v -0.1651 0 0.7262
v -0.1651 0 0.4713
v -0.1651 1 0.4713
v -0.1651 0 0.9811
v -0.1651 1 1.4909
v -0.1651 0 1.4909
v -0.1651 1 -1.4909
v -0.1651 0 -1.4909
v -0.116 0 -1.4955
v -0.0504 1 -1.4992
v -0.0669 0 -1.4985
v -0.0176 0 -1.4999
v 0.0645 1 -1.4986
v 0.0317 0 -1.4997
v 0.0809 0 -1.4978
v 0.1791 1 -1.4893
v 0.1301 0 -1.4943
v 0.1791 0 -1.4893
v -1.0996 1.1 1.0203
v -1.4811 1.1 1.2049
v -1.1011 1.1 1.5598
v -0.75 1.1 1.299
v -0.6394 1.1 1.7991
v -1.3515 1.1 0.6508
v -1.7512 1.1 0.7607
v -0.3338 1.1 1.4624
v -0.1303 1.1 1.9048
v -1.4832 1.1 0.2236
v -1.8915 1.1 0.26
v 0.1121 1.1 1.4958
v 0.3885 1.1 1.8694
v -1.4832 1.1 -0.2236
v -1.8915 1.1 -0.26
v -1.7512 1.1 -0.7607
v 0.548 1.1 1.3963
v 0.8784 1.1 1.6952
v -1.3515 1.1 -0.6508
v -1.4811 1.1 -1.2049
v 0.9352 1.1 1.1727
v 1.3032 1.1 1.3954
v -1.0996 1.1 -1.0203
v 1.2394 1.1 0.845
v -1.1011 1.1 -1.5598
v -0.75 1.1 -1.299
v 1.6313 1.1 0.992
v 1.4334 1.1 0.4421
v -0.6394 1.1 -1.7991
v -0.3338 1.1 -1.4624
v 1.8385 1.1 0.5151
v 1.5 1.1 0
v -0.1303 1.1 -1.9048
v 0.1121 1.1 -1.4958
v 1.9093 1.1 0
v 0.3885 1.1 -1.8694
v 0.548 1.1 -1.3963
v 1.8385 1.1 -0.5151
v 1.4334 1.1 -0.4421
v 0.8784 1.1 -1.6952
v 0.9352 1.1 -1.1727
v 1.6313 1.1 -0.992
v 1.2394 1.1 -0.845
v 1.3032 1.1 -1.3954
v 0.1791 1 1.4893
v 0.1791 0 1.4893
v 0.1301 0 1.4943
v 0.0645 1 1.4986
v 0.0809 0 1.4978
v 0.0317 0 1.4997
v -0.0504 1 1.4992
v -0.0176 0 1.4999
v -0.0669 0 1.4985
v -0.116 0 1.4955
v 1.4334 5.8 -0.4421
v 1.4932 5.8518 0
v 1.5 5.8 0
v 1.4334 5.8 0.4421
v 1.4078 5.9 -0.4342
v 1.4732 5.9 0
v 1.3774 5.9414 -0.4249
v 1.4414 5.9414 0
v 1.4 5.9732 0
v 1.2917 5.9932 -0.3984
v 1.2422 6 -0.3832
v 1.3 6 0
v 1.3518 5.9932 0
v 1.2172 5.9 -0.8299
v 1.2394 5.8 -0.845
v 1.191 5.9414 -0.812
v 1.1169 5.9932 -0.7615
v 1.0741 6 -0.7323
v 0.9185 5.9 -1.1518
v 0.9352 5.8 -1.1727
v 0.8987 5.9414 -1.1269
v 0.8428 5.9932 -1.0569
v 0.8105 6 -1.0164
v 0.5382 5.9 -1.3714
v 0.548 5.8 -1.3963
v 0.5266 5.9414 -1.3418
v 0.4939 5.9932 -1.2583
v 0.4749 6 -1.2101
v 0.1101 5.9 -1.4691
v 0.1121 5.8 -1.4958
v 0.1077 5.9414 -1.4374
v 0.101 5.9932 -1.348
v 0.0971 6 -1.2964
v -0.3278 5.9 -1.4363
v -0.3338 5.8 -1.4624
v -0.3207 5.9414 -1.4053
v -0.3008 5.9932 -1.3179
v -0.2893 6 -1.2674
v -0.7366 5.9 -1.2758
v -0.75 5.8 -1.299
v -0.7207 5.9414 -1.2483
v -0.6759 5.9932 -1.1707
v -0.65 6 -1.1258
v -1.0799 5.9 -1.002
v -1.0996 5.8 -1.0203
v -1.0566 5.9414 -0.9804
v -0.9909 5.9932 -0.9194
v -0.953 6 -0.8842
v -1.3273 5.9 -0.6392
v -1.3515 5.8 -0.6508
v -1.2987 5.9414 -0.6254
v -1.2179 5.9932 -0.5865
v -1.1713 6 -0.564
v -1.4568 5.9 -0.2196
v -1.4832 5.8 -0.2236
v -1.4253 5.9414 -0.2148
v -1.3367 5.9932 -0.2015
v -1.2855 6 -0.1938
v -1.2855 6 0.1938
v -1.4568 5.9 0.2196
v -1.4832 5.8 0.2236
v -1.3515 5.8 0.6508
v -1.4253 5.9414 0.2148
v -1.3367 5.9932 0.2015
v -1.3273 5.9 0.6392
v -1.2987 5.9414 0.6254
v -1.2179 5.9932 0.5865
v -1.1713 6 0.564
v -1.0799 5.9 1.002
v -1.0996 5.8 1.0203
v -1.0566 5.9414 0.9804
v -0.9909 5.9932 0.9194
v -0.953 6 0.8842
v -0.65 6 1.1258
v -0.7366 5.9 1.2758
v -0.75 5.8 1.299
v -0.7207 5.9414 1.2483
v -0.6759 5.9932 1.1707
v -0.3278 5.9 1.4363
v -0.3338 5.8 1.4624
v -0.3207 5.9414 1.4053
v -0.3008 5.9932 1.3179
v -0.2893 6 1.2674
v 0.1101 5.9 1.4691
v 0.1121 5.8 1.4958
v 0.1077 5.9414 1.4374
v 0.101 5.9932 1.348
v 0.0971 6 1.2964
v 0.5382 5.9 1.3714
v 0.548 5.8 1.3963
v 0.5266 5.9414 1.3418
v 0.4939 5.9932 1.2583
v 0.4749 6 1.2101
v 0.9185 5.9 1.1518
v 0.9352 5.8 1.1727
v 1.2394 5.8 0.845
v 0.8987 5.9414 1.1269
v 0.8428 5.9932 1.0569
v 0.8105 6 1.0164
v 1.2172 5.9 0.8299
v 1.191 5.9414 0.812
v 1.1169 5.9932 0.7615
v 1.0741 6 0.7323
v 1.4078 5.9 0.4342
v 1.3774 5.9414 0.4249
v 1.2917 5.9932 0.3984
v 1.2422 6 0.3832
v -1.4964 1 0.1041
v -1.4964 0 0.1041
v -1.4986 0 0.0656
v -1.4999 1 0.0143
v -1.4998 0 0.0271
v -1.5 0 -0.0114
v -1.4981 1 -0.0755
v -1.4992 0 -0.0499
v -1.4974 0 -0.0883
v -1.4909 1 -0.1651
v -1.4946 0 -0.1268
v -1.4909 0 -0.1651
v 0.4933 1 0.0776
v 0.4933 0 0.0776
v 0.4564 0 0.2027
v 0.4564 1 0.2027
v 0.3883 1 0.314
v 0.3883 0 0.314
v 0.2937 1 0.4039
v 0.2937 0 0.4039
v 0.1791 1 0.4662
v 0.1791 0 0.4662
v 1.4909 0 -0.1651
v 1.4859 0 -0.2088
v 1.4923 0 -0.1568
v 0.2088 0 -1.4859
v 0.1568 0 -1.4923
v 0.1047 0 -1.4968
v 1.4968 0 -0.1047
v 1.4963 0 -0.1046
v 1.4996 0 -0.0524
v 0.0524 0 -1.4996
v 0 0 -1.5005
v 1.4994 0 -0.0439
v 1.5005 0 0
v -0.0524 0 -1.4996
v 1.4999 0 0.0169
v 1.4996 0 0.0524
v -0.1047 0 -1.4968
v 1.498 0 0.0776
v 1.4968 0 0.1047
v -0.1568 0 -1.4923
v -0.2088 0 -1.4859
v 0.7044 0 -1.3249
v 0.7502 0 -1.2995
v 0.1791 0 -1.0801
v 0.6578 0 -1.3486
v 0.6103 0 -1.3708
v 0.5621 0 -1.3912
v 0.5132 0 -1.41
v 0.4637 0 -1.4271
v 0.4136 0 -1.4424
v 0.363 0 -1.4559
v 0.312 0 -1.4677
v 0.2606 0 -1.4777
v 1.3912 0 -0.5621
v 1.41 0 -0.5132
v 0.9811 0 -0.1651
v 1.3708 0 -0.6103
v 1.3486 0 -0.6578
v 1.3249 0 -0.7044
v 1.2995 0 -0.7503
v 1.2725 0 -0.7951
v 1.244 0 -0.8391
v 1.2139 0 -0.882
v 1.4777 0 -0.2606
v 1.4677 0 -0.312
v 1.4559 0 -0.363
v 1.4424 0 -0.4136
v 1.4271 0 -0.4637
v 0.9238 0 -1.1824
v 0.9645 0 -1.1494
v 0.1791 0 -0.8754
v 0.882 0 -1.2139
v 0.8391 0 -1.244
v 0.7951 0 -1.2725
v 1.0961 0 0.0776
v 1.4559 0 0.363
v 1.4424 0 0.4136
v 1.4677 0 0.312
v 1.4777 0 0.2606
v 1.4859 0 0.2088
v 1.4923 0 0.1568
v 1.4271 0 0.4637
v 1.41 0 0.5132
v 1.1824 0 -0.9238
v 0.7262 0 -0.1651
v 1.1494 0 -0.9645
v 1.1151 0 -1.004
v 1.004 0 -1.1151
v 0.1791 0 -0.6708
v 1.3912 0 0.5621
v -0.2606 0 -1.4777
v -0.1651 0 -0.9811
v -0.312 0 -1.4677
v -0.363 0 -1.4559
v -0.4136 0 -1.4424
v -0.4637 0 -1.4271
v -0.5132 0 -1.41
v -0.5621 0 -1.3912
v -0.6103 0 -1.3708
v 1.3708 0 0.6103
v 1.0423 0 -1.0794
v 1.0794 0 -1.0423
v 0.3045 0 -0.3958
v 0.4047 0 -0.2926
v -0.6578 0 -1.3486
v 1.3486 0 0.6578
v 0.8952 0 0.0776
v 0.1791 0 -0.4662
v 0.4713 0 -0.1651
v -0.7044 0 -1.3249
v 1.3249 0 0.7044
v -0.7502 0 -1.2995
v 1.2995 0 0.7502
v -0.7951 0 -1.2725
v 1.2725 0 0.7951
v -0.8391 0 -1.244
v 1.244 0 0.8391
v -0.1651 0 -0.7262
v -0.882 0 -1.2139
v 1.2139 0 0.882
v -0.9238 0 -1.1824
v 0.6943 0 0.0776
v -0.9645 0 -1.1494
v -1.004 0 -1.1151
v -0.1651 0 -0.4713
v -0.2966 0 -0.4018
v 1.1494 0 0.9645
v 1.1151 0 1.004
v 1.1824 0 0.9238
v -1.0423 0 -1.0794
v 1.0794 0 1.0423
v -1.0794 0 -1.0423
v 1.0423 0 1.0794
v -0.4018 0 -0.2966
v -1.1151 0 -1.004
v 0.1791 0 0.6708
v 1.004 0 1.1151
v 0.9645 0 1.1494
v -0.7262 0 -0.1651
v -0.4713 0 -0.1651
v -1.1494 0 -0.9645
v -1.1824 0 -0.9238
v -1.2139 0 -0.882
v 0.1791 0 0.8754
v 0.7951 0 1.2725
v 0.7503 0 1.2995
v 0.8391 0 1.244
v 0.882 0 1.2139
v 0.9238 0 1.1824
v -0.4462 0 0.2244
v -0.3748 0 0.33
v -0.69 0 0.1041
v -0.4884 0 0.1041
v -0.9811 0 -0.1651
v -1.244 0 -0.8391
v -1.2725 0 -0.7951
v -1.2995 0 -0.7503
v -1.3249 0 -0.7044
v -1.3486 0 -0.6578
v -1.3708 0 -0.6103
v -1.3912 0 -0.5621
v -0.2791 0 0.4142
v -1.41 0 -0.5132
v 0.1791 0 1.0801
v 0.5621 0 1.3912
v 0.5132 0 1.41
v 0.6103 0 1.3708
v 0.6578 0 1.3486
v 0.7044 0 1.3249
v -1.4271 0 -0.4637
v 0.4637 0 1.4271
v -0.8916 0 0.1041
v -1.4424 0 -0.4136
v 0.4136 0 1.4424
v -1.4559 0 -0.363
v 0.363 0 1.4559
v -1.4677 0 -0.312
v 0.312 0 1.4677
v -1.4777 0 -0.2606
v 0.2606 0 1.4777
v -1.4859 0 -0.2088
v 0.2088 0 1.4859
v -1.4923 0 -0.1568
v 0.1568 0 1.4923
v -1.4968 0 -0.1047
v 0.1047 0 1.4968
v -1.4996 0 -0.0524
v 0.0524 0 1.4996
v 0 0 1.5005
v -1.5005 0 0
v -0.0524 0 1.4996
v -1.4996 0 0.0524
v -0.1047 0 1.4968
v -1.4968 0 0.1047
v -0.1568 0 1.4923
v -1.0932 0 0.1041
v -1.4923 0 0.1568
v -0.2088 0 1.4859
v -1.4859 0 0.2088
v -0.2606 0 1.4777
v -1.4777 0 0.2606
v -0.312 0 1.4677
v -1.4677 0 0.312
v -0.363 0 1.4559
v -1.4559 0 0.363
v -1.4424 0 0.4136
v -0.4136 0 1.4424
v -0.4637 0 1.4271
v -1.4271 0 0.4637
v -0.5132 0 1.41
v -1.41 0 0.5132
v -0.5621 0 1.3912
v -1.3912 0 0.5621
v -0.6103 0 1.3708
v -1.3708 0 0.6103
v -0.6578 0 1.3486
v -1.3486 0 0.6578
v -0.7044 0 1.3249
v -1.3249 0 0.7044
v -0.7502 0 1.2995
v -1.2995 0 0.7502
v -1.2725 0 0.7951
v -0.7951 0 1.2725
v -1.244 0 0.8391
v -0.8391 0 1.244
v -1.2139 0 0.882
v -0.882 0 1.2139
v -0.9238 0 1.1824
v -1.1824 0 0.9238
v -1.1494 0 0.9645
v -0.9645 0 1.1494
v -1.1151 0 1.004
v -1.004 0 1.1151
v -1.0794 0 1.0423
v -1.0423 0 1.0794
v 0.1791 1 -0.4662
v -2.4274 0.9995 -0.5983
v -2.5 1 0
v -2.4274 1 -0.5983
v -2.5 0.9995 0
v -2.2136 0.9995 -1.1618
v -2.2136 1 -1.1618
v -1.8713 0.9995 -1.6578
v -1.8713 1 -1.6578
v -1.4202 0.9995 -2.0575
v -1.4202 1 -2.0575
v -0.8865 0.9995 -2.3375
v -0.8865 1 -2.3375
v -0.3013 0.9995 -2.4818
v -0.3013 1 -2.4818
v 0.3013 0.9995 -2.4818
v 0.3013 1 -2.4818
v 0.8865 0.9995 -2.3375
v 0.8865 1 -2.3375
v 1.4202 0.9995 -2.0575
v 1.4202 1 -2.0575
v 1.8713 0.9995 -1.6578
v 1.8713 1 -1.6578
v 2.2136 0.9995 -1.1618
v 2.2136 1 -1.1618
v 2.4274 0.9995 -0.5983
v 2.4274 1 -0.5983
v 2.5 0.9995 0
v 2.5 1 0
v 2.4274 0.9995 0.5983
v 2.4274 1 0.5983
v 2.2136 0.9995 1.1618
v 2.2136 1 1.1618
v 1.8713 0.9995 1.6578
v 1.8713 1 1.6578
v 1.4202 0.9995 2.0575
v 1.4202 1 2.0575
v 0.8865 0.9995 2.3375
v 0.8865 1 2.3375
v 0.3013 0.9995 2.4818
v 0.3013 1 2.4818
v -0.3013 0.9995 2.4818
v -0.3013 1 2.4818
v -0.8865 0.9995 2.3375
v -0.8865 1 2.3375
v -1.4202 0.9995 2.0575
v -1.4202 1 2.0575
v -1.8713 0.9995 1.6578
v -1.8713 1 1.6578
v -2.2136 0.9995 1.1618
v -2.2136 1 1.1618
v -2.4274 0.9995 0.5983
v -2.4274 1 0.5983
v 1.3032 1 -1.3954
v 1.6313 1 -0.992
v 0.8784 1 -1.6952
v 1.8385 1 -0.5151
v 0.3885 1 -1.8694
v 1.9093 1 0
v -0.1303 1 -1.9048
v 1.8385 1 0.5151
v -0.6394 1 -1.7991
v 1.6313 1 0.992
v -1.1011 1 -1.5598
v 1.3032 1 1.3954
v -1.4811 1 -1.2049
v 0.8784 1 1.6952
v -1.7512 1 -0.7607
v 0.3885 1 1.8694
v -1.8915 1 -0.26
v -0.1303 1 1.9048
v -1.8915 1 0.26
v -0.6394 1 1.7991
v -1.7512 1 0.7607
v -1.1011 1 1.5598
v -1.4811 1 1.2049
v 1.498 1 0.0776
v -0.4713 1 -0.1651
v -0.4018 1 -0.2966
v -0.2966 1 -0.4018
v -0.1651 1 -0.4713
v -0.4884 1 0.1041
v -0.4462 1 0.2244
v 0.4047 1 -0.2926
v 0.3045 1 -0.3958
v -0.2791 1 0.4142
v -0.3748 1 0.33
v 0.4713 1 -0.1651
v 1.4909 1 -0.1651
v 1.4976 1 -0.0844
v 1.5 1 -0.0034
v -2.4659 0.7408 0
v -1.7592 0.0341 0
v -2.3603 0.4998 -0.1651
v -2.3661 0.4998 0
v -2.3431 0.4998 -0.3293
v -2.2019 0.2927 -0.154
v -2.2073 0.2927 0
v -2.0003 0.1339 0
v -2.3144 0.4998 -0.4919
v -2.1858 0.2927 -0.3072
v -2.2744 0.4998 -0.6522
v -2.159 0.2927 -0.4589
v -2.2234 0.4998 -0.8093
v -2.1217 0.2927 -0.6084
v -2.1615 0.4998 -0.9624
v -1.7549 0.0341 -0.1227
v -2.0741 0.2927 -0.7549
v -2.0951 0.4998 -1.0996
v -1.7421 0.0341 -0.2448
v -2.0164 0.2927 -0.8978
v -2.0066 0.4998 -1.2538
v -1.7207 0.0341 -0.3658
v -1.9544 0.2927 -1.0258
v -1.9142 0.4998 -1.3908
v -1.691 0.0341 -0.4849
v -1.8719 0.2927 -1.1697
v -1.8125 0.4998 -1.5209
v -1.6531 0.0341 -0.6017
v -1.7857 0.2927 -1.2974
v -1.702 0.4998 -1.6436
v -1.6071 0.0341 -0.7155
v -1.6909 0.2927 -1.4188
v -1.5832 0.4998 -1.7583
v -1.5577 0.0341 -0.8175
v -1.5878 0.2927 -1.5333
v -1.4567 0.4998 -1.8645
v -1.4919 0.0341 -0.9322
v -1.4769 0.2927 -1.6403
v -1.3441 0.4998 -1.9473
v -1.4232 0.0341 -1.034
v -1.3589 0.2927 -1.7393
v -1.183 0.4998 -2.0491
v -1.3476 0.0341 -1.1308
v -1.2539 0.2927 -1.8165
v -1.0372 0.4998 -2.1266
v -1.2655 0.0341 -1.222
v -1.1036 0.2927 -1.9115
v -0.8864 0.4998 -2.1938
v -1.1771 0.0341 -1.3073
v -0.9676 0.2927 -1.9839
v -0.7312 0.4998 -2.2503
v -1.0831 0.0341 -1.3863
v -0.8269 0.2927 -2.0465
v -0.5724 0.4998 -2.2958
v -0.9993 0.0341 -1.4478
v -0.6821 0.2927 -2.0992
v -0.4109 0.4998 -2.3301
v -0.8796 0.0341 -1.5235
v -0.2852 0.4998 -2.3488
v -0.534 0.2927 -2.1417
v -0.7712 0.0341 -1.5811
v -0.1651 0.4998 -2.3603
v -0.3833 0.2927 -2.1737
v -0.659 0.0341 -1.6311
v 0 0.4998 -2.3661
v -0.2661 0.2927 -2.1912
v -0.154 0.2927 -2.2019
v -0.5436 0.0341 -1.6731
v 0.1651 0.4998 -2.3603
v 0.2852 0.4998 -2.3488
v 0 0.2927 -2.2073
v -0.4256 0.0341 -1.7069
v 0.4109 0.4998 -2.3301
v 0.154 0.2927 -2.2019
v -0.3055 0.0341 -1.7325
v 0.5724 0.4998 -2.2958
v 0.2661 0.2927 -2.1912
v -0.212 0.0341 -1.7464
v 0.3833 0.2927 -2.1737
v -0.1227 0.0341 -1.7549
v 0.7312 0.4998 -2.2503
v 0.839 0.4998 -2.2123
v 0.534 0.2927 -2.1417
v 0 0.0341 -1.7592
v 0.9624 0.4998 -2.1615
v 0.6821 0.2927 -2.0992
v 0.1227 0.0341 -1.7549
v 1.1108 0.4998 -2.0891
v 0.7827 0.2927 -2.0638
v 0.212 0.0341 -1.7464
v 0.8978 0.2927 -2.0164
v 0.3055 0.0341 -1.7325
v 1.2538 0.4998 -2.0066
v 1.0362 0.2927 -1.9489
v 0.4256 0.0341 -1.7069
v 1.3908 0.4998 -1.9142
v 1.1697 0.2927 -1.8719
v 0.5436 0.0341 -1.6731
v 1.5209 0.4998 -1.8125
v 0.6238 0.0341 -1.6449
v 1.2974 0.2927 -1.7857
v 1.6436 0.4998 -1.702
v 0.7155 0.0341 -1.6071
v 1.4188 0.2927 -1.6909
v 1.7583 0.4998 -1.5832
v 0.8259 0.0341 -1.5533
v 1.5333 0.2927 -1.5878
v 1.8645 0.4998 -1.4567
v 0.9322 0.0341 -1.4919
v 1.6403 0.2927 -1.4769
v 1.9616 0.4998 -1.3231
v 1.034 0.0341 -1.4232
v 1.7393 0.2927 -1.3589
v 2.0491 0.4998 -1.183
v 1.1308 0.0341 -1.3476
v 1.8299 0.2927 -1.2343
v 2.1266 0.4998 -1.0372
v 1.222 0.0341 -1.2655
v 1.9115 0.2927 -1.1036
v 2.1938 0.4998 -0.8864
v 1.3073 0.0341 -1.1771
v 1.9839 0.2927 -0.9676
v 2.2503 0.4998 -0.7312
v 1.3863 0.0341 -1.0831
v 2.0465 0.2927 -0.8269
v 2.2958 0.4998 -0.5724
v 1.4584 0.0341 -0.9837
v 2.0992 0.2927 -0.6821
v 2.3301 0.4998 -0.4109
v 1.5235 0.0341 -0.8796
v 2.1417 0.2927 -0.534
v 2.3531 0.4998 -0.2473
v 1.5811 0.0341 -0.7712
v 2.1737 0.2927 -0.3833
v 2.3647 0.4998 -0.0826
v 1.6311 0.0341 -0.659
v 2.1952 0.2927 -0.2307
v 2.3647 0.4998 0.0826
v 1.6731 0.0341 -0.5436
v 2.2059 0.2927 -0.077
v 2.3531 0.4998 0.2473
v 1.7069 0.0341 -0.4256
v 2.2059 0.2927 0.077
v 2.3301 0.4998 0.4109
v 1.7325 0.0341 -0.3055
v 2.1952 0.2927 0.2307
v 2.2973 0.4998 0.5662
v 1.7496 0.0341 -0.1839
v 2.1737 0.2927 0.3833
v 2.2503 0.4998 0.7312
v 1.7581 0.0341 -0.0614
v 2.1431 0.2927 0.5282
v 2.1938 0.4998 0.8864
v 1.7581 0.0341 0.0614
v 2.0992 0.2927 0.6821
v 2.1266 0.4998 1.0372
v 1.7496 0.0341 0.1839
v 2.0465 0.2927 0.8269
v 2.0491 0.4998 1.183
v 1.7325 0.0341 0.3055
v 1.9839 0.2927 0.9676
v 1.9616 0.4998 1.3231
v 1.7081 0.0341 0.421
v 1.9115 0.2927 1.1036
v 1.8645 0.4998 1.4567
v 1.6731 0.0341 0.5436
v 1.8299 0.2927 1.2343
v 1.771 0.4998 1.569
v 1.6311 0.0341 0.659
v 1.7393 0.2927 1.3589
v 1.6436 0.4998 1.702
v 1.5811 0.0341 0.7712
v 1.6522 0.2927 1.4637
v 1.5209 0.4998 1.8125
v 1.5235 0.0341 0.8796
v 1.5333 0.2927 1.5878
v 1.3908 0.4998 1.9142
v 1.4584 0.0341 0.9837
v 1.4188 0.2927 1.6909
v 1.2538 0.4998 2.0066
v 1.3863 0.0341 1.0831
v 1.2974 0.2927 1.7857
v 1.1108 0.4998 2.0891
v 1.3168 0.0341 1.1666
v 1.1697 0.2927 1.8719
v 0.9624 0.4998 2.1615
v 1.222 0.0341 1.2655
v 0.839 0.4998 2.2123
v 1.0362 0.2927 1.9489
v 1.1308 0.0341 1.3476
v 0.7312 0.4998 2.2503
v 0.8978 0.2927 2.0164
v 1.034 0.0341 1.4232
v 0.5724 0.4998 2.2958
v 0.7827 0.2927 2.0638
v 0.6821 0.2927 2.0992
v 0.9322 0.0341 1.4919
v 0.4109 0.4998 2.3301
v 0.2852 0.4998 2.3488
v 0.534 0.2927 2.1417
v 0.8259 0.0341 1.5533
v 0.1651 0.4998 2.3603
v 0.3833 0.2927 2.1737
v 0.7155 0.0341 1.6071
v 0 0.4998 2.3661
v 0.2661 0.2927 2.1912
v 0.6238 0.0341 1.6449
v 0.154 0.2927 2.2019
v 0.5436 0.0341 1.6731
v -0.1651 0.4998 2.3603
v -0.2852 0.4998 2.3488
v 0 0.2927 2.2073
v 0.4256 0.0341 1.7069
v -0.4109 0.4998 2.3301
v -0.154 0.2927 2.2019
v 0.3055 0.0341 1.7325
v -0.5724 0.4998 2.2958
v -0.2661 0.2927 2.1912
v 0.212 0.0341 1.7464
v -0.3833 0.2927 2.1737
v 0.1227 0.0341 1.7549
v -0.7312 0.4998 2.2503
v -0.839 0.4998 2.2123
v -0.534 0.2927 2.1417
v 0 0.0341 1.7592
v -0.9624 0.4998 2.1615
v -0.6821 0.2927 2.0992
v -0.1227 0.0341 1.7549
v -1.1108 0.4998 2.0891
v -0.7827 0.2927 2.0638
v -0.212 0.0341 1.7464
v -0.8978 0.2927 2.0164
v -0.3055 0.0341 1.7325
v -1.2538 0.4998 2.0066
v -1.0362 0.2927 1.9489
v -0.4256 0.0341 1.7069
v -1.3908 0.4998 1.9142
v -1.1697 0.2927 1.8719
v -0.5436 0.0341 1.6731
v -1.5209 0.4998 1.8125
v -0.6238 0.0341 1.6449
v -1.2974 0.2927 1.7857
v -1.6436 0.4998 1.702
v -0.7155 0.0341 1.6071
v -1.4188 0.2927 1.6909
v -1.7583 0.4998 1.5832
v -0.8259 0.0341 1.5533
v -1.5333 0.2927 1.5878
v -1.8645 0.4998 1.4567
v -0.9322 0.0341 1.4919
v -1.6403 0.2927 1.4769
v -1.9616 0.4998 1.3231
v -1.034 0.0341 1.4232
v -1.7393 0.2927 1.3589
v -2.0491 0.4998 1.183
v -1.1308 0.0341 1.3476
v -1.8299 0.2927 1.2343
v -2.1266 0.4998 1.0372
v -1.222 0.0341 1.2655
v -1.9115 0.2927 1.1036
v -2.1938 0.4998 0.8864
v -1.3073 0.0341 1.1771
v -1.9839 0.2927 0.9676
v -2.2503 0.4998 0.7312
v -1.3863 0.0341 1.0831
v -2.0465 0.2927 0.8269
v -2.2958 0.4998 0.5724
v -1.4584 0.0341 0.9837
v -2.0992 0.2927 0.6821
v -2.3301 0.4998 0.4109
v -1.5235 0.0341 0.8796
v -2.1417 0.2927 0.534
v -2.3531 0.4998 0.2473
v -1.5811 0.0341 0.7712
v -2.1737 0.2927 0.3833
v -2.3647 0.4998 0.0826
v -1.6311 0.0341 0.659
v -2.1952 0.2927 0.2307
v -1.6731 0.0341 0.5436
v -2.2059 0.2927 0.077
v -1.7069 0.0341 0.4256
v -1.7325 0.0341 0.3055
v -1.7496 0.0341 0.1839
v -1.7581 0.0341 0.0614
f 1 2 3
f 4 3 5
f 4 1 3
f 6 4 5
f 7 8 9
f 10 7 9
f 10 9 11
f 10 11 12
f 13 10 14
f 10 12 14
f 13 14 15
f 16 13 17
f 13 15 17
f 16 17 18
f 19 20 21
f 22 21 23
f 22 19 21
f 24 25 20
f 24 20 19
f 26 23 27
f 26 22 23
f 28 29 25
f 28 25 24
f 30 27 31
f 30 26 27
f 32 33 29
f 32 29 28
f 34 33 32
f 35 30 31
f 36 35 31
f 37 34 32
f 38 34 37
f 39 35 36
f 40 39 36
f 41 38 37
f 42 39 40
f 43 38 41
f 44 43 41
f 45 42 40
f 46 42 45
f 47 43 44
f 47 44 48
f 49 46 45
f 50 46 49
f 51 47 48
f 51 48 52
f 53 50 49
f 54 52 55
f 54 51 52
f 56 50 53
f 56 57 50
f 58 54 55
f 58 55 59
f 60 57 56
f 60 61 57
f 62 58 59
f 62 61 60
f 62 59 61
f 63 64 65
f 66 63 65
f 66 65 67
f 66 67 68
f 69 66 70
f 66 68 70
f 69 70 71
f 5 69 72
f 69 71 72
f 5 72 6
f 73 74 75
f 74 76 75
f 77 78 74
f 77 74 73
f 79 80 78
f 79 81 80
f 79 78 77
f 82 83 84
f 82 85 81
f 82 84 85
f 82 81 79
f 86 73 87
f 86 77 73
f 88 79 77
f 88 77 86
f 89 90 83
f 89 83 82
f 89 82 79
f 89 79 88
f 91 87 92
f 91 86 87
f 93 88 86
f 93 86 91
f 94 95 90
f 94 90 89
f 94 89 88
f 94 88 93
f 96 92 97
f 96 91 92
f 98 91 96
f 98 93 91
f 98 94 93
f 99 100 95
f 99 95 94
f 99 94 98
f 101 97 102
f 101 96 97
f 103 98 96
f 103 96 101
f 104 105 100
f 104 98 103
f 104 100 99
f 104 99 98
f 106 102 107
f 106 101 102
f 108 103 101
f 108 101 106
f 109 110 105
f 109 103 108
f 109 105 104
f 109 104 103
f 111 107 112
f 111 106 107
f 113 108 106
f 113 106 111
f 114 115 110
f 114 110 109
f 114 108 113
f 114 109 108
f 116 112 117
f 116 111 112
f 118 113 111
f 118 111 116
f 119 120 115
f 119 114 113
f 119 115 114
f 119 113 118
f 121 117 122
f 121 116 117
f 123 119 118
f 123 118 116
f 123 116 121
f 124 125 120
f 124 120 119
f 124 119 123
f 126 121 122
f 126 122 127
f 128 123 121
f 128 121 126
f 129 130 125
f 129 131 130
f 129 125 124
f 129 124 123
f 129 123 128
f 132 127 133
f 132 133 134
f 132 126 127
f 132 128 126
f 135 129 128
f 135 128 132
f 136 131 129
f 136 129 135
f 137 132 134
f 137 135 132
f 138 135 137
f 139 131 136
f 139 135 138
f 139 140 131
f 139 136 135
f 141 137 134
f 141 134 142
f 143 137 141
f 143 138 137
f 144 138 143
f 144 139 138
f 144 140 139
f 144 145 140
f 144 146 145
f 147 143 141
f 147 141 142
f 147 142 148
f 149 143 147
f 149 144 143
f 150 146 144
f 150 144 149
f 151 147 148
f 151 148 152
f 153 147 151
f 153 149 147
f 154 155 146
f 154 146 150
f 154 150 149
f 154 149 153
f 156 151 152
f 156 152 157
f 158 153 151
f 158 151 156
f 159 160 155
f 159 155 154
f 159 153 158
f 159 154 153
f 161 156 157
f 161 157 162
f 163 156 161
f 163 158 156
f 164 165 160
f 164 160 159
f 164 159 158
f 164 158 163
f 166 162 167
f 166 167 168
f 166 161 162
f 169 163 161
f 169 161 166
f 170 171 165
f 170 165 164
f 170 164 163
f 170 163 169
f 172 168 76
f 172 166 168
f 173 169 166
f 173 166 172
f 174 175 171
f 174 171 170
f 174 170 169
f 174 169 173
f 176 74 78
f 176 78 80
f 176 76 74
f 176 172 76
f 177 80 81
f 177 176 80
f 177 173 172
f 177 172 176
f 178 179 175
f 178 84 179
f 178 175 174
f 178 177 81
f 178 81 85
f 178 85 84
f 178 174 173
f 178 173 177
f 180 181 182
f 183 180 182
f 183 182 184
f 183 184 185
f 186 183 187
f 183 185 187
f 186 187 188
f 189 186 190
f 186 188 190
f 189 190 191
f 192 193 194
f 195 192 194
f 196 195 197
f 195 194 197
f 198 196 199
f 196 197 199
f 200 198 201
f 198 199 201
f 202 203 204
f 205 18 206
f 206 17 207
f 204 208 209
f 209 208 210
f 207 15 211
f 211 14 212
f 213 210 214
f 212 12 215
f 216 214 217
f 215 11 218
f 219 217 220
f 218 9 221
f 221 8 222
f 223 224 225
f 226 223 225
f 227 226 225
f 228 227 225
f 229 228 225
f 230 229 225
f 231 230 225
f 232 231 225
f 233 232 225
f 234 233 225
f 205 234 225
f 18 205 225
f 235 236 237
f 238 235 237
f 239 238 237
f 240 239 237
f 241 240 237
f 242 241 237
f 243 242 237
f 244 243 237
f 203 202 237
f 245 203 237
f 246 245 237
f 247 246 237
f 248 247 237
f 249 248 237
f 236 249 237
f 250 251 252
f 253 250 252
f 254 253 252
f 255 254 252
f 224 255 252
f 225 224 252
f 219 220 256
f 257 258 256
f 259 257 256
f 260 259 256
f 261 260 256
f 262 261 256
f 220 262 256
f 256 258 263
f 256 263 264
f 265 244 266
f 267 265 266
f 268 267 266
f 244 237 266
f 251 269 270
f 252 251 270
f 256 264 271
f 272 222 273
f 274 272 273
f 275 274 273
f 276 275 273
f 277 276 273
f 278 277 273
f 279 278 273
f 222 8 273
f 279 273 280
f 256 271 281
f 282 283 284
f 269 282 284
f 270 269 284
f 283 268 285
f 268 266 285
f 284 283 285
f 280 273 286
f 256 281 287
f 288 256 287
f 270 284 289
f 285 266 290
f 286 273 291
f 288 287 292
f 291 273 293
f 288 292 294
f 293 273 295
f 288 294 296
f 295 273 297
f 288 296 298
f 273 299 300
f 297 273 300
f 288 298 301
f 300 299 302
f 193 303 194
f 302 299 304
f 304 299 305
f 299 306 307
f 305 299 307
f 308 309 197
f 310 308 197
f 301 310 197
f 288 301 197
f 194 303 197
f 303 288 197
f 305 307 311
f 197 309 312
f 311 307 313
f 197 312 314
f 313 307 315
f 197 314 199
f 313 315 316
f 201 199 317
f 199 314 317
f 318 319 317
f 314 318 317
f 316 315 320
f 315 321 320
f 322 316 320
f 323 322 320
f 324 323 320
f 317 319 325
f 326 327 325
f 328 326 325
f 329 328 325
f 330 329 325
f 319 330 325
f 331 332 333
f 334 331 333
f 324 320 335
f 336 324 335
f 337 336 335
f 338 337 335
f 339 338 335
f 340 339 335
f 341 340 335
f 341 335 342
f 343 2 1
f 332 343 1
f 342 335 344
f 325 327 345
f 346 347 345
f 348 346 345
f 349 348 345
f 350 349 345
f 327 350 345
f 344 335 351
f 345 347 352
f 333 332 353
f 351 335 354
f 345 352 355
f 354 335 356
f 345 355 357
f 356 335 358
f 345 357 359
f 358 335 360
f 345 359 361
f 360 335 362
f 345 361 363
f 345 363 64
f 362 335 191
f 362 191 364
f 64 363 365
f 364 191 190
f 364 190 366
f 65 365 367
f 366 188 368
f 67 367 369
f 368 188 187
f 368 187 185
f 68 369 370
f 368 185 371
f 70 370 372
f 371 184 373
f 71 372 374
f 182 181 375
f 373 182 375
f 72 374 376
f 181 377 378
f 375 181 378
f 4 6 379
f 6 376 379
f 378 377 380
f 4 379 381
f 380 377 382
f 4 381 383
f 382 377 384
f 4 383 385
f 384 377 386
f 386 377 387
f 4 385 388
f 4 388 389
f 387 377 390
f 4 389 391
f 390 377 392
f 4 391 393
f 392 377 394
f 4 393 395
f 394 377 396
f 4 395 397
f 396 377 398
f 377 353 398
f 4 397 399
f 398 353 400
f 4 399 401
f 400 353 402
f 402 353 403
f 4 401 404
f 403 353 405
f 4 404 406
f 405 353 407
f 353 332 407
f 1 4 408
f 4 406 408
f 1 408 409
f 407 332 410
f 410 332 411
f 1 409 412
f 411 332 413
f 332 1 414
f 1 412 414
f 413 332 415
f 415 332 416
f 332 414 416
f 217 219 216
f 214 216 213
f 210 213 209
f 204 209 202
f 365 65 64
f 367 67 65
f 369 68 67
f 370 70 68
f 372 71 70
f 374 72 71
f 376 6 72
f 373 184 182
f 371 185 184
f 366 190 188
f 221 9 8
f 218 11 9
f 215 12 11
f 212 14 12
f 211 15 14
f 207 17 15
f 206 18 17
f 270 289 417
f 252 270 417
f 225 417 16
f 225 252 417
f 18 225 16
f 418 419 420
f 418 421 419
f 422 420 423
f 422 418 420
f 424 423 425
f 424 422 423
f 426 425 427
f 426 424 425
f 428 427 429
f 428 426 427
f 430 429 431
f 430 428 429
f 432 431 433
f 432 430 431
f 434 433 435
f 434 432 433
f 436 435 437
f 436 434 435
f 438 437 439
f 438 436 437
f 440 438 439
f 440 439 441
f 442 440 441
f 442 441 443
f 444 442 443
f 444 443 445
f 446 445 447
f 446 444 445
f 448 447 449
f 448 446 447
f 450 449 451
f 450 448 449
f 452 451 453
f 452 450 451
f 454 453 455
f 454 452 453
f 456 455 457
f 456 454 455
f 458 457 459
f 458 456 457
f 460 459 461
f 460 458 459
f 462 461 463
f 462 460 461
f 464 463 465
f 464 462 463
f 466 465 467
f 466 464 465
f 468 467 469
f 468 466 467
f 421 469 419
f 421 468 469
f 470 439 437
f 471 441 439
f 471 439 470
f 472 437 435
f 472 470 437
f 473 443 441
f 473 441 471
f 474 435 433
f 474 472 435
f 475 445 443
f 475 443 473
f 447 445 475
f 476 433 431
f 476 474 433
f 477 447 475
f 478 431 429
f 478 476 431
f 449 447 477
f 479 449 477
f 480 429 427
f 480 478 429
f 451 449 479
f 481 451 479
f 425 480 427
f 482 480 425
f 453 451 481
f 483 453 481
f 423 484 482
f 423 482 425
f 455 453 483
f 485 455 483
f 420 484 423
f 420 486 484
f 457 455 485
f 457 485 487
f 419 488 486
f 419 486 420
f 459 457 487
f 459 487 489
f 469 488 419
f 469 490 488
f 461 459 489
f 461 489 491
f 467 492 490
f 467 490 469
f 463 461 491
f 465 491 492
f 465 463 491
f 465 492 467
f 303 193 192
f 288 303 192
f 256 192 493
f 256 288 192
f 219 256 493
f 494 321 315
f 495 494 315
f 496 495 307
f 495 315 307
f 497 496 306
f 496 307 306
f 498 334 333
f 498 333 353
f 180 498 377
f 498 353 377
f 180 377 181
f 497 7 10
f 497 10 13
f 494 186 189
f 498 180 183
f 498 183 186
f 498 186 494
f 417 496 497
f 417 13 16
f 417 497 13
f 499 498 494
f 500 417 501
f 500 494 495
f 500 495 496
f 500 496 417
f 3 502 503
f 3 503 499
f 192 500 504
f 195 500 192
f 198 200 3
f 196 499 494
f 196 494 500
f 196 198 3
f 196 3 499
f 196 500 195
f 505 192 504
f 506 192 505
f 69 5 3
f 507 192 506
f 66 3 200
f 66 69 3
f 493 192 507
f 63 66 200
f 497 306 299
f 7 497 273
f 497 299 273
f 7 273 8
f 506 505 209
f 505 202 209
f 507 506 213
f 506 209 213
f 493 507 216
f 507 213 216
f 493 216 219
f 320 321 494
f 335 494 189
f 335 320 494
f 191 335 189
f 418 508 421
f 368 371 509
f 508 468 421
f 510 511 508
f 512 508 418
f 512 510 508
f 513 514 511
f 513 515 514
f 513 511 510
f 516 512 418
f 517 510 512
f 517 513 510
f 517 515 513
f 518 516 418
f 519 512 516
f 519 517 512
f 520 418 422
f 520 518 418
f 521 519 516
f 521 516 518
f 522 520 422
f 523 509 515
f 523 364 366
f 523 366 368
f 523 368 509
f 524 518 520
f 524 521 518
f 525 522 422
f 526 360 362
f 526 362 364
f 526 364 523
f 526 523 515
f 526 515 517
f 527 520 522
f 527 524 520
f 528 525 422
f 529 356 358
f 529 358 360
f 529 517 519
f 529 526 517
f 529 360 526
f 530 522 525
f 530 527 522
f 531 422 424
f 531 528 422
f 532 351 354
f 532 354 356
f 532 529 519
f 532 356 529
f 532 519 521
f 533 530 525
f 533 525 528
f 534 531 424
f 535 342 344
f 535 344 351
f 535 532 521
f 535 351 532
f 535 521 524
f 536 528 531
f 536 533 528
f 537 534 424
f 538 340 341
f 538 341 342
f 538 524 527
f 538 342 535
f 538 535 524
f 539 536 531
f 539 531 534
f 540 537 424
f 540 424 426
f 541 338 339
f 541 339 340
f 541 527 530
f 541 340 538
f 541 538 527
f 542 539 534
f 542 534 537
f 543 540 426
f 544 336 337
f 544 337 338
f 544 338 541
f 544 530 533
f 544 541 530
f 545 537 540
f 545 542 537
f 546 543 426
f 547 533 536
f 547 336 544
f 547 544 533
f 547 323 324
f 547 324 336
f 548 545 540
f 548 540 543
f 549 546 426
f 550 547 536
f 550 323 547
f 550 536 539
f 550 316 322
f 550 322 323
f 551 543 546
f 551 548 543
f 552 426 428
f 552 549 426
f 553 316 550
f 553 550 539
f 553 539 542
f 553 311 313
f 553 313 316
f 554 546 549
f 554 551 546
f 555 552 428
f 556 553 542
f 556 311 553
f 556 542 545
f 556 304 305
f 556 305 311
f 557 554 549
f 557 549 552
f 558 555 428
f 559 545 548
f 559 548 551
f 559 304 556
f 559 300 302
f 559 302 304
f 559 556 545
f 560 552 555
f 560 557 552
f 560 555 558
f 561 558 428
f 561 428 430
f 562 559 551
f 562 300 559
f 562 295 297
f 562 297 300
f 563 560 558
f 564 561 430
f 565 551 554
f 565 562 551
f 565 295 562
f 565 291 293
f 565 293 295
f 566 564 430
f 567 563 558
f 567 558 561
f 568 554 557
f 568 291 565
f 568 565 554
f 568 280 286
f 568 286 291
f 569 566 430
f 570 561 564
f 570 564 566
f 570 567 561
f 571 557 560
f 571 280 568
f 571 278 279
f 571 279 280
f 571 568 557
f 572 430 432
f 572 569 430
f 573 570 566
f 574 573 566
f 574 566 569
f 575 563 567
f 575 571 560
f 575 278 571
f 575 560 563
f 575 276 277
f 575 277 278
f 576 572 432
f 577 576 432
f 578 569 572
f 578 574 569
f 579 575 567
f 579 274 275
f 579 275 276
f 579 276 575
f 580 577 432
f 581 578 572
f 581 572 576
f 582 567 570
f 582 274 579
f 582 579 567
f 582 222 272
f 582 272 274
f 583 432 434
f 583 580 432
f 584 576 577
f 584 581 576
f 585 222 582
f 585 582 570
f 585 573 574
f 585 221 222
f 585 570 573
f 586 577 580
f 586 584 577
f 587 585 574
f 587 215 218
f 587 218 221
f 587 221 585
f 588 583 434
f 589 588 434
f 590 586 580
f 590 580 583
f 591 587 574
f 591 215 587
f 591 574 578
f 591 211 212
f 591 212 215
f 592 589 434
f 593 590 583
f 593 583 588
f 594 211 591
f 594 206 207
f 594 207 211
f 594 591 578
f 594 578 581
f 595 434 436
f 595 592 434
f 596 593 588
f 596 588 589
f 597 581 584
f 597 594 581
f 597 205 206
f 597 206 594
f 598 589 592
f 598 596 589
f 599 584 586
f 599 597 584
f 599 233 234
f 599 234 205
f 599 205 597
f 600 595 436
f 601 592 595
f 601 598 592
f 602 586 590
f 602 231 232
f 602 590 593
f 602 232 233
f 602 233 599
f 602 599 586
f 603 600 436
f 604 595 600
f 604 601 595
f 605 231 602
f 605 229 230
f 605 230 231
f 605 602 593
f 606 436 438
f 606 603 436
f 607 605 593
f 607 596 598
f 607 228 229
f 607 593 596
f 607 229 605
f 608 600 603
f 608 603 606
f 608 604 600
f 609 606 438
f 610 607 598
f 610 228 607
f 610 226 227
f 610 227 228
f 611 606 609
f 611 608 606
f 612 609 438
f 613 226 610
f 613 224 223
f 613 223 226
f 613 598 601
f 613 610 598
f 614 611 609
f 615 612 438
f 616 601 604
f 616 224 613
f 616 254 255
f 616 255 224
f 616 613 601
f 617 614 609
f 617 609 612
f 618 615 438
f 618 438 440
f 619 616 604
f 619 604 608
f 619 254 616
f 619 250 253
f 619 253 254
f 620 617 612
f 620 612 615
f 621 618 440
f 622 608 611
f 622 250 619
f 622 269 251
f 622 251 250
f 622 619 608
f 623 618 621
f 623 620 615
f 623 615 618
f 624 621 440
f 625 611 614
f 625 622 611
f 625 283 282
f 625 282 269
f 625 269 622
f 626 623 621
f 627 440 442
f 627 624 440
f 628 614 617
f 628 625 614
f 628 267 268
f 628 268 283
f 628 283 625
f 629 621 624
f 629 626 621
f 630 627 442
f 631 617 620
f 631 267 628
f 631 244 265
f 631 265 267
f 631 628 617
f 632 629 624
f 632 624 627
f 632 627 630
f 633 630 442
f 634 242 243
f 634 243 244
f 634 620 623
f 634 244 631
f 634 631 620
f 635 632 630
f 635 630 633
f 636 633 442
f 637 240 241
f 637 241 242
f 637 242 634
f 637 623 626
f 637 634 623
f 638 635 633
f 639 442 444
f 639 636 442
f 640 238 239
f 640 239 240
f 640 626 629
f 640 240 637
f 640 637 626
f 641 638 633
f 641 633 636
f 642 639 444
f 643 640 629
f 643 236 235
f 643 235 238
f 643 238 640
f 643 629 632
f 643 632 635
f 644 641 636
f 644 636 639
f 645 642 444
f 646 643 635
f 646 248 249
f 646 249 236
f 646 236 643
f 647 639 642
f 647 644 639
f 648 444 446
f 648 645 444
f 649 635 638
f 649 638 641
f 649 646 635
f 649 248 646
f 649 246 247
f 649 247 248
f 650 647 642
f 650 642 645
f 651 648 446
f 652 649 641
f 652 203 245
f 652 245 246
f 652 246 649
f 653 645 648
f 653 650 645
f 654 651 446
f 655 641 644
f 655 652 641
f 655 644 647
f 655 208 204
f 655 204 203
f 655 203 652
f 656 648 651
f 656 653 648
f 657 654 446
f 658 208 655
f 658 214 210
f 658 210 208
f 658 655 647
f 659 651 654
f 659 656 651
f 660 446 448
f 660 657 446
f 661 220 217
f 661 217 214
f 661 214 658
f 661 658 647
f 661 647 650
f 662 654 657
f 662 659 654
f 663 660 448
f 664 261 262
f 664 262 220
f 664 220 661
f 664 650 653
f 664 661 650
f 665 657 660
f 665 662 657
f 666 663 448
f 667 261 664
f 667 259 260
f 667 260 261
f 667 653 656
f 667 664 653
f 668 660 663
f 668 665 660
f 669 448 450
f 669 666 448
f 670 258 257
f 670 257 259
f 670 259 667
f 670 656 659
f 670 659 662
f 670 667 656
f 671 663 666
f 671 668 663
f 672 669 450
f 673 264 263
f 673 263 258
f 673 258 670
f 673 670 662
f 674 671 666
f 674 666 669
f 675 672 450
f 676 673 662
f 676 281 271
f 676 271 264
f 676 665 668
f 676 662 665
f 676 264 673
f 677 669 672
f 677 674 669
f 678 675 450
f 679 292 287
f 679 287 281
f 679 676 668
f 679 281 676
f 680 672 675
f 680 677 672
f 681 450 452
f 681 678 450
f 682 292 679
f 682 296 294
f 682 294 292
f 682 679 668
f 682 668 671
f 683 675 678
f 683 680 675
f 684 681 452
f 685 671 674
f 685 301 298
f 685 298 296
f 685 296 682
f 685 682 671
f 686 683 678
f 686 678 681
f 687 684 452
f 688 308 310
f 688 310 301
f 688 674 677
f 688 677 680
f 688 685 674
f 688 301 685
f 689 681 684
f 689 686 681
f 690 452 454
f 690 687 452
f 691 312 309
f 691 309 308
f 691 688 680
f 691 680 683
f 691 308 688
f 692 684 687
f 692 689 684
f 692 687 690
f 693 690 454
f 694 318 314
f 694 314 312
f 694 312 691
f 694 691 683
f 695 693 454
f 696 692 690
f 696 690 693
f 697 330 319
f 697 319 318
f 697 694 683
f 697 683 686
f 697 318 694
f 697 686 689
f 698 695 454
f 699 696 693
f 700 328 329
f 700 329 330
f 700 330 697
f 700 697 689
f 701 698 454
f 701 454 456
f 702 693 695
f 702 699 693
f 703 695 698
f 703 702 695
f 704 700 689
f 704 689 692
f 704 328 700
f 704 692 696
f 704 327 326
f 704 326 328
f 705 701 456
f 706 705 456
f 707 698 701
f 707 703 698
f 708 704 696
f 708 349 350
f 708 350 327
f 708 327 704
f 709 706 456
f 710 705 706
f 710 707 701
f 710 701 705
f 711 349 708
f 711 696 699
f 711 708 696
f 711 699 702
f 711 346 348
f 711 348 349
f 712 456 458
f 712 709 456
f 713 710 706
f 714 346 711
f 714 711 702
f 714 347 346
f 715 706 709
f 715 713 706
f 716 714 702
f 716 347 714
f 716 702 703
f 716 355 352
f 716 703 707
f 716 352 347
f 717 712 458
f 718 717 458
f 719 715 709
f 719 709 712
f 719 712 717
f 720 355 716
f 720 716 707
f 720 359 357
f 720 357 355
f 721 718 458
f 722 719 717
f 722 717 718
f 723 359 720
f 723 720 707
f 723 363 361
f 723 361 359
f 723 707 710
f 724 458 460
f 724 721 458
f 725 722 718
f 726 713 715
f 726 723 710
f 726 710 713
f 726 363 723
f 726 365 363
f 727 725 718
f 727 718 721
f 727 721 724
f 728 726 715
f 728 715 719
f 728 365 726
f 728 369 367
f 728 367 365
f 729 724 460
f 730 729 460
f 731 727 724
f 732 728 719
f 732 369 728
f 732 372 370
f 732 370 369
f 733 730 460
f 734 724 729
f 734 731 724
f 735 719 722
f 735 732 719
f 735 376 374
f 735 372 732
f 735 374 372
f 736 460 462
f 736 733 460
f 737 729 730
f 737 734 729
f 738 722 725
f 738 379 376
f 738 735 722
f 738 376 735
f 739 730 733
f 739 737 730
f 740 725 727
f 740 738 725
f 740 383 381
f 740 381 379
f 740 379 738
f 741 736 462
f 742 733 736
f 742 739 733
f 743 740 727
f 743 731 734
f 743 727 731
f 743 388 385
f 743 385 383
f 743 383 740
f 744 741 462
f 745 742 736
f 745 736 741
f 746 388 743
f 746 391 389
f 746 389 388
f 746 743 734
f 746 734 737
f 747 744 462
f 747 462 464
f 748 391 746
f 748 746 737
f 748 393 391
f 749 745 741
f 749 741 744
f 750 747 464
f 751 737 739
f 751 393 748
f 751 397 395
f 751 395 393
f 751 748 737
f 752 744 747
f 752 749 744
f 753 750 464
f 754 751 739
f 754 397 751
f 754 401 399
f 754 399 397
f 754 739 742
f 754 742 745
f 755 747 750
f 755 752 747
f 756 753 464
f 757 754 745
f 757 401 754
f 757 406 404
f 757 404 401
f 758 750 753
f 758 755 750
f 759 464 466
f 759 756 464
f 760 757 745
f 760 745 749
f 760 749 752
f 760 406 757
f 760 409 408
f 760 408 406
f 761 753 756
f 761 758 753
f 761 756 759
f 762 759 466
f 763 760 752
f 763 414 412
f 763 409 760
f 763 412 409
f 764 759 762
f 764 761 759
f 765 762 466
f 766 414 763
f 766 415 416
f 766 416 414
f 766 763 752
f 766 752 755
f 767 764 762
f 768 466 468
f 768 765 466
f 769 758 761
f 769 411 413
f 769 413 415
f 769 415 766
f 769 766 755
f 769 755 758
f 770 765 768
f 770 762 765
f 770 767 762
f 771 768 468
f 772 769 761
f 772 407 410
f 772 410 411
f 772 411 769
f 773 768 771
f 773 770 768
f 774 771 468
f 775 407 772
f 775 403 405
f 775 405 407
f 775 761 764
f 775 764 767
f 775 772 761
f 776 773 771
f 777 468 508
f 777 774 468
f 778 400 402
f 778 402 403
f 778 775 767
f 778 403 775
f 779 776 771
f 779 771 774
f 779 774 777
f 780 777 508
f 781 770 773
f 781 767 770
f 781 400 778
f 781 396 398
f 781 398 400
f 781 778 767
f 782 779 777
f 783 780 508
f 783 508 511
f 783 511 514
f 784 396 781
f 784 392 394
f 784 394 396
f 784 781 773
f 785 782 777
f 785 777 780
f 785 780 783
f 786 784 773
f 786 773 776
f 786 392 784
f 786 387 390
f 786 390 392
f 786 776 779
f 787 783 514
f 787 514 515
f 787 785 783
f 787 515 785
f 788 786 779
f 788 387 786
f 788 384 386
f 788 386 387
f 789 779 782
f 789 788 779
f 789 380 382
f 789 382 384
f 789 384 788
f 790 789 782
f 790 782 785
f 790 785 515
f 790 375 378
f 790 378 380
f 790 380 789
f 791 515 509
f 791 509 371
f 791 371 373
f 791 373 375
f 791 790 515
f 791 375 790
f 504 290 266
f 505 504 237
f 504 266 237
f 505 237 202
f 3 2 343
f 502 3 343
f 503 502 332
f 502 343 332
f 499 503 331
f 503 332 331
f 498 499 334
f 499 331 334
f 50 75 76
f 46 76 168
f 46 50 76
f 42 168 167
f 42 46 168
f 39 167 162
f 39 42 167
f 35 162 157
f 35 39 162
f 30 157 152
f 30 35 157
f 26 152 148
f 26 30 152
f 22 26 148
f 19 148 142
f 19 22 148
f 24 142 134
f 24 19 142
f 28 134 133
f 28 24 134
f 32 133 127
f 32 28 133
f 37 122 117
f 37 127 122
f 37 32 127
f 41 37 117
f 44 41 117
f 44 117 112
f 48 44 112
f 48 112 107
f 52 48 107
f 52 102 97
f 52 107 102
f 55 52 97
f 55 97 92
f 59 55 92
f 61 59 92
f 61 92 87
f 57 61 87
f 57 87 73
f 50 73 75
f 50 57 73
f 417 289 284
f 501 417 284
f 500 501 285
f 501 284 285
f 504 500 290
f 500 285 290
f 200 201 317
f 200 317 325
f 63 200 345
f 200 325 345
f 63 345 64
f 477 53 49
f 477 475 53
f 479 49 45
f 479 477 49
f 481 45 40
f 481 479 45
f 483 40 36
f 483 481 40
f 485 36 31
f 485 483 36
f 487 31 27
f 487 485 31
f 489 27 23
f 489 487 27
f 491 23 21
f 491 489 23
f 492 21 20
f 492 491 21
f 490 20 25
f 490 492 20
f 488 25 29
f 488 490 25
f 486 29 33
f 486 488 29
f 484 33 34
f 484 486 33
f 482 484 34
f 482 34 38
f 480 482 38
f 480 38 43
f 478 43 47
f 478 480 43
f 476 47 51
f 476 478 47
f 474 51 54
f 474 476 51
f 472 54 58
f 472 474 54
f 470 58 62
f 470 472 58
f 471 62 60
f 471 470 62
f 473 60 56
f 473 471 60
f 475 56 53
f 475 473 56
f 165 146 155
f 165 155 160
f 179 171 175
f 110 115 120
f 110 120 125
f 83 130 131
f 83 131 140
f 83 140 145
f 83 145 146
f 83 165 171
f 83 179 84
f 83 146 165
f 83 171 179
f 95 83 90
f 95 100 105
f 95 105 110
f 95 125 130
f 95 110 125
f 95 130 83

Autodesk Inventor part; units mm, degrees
ref_plane "YZ Plane" through (0, 0, 0) normal (1, 0, 0) x (0, 1, 0)
ref_plane "XZ Plane" through (0, 0, 0) normal (0, 1, 0) x (-1, 0, 0)
ref_plane "XY Plane" through (0, 0, 0) normal (0, 0, 1) x (1, 0, 0)
sketch "Sketch1" plane through (0, 0, 0) normal (0, 1, 0) x (-1, 0, 0)
  circle A0 centre (0, 0) radius 2.5
  circle A1 centre (0, 0) radius 1.5
  dimension "d0" = 5
  dimension "d1" = 3
extrude "Extrusion1" add sketch "Sketch1" along normal blind 1
sketch "Sketch2" plane through (0, 1, 0) normal (0, 1, 0) x (1, 0, 0)
  circle A0 centre (0, 0) radius 1.5
  dimension "d4" = 3
extrude "Extrusion2" add sketch "Sketch2" along normal blind 5 and the other way blind 1
sketch "Sketch4" plane through (0, 0, 0) normal (0, -1, 0) x (1, 0, 0)
  circle A0 centre (0, 0) radius 1.5 projected
  line L0 (-0.1651, 0.1041) -> (-0.1651, 1.4909)
  line L1 (0.1791, 0.0776) -> (0.1791, 1.4893)
  line L2 (-0.1651, -0.1651) -> (-0.1651, -1.4909)
  line L3 (0.1791, -0.0776) -> (0.1791, -1.4893)
  line L4 (-0.1651, -0.1651) -> (-1.4909, -0.1651)
  line L5 (0.1791, -0.1651) -> (1.4909, -0.1651)
  line L6 (-0.1651, 0.1041) -> (-1.4964, 0.1041)
  line L7 (0.1791, 0.0776) -> (1.498, 0.0776)
  circle A1 centre (0, 0) radius 0.4994
extrude "Extrusion4" cut sketch "Sketch4" against normal blind 1 contours A0 L5 A1 L7 | L1 A1 L0 A0 | A1 L5 L3 L2 L4 L6 L0 L1 L7 | L7 L1 A1 | A0 L2 A1 L3 | A1 L3 L5 | L6 A1 L4 A0 | L0 L6 A1 | A1 L4 L2
fillet "Fillet1" radius 1 1 edges at (2.5, 0, 0)
fillet "Fillet2" radius 0.2 1 edges at (-1.5, 6, 0)
sketch "Sketch5" plane through (0, 1, 0) normal (0, 1, 0) x (1, 0, 0)
  circle A0 centre (0, 0) radius 1.9093
extrude "Extrusion5" add sketch "Sketch5" along normal blind 0.1
thread "Thread1" size "M3x0.5" class "6g" standard "ANSI Metric M Profile" full length
properties part number "screw"
